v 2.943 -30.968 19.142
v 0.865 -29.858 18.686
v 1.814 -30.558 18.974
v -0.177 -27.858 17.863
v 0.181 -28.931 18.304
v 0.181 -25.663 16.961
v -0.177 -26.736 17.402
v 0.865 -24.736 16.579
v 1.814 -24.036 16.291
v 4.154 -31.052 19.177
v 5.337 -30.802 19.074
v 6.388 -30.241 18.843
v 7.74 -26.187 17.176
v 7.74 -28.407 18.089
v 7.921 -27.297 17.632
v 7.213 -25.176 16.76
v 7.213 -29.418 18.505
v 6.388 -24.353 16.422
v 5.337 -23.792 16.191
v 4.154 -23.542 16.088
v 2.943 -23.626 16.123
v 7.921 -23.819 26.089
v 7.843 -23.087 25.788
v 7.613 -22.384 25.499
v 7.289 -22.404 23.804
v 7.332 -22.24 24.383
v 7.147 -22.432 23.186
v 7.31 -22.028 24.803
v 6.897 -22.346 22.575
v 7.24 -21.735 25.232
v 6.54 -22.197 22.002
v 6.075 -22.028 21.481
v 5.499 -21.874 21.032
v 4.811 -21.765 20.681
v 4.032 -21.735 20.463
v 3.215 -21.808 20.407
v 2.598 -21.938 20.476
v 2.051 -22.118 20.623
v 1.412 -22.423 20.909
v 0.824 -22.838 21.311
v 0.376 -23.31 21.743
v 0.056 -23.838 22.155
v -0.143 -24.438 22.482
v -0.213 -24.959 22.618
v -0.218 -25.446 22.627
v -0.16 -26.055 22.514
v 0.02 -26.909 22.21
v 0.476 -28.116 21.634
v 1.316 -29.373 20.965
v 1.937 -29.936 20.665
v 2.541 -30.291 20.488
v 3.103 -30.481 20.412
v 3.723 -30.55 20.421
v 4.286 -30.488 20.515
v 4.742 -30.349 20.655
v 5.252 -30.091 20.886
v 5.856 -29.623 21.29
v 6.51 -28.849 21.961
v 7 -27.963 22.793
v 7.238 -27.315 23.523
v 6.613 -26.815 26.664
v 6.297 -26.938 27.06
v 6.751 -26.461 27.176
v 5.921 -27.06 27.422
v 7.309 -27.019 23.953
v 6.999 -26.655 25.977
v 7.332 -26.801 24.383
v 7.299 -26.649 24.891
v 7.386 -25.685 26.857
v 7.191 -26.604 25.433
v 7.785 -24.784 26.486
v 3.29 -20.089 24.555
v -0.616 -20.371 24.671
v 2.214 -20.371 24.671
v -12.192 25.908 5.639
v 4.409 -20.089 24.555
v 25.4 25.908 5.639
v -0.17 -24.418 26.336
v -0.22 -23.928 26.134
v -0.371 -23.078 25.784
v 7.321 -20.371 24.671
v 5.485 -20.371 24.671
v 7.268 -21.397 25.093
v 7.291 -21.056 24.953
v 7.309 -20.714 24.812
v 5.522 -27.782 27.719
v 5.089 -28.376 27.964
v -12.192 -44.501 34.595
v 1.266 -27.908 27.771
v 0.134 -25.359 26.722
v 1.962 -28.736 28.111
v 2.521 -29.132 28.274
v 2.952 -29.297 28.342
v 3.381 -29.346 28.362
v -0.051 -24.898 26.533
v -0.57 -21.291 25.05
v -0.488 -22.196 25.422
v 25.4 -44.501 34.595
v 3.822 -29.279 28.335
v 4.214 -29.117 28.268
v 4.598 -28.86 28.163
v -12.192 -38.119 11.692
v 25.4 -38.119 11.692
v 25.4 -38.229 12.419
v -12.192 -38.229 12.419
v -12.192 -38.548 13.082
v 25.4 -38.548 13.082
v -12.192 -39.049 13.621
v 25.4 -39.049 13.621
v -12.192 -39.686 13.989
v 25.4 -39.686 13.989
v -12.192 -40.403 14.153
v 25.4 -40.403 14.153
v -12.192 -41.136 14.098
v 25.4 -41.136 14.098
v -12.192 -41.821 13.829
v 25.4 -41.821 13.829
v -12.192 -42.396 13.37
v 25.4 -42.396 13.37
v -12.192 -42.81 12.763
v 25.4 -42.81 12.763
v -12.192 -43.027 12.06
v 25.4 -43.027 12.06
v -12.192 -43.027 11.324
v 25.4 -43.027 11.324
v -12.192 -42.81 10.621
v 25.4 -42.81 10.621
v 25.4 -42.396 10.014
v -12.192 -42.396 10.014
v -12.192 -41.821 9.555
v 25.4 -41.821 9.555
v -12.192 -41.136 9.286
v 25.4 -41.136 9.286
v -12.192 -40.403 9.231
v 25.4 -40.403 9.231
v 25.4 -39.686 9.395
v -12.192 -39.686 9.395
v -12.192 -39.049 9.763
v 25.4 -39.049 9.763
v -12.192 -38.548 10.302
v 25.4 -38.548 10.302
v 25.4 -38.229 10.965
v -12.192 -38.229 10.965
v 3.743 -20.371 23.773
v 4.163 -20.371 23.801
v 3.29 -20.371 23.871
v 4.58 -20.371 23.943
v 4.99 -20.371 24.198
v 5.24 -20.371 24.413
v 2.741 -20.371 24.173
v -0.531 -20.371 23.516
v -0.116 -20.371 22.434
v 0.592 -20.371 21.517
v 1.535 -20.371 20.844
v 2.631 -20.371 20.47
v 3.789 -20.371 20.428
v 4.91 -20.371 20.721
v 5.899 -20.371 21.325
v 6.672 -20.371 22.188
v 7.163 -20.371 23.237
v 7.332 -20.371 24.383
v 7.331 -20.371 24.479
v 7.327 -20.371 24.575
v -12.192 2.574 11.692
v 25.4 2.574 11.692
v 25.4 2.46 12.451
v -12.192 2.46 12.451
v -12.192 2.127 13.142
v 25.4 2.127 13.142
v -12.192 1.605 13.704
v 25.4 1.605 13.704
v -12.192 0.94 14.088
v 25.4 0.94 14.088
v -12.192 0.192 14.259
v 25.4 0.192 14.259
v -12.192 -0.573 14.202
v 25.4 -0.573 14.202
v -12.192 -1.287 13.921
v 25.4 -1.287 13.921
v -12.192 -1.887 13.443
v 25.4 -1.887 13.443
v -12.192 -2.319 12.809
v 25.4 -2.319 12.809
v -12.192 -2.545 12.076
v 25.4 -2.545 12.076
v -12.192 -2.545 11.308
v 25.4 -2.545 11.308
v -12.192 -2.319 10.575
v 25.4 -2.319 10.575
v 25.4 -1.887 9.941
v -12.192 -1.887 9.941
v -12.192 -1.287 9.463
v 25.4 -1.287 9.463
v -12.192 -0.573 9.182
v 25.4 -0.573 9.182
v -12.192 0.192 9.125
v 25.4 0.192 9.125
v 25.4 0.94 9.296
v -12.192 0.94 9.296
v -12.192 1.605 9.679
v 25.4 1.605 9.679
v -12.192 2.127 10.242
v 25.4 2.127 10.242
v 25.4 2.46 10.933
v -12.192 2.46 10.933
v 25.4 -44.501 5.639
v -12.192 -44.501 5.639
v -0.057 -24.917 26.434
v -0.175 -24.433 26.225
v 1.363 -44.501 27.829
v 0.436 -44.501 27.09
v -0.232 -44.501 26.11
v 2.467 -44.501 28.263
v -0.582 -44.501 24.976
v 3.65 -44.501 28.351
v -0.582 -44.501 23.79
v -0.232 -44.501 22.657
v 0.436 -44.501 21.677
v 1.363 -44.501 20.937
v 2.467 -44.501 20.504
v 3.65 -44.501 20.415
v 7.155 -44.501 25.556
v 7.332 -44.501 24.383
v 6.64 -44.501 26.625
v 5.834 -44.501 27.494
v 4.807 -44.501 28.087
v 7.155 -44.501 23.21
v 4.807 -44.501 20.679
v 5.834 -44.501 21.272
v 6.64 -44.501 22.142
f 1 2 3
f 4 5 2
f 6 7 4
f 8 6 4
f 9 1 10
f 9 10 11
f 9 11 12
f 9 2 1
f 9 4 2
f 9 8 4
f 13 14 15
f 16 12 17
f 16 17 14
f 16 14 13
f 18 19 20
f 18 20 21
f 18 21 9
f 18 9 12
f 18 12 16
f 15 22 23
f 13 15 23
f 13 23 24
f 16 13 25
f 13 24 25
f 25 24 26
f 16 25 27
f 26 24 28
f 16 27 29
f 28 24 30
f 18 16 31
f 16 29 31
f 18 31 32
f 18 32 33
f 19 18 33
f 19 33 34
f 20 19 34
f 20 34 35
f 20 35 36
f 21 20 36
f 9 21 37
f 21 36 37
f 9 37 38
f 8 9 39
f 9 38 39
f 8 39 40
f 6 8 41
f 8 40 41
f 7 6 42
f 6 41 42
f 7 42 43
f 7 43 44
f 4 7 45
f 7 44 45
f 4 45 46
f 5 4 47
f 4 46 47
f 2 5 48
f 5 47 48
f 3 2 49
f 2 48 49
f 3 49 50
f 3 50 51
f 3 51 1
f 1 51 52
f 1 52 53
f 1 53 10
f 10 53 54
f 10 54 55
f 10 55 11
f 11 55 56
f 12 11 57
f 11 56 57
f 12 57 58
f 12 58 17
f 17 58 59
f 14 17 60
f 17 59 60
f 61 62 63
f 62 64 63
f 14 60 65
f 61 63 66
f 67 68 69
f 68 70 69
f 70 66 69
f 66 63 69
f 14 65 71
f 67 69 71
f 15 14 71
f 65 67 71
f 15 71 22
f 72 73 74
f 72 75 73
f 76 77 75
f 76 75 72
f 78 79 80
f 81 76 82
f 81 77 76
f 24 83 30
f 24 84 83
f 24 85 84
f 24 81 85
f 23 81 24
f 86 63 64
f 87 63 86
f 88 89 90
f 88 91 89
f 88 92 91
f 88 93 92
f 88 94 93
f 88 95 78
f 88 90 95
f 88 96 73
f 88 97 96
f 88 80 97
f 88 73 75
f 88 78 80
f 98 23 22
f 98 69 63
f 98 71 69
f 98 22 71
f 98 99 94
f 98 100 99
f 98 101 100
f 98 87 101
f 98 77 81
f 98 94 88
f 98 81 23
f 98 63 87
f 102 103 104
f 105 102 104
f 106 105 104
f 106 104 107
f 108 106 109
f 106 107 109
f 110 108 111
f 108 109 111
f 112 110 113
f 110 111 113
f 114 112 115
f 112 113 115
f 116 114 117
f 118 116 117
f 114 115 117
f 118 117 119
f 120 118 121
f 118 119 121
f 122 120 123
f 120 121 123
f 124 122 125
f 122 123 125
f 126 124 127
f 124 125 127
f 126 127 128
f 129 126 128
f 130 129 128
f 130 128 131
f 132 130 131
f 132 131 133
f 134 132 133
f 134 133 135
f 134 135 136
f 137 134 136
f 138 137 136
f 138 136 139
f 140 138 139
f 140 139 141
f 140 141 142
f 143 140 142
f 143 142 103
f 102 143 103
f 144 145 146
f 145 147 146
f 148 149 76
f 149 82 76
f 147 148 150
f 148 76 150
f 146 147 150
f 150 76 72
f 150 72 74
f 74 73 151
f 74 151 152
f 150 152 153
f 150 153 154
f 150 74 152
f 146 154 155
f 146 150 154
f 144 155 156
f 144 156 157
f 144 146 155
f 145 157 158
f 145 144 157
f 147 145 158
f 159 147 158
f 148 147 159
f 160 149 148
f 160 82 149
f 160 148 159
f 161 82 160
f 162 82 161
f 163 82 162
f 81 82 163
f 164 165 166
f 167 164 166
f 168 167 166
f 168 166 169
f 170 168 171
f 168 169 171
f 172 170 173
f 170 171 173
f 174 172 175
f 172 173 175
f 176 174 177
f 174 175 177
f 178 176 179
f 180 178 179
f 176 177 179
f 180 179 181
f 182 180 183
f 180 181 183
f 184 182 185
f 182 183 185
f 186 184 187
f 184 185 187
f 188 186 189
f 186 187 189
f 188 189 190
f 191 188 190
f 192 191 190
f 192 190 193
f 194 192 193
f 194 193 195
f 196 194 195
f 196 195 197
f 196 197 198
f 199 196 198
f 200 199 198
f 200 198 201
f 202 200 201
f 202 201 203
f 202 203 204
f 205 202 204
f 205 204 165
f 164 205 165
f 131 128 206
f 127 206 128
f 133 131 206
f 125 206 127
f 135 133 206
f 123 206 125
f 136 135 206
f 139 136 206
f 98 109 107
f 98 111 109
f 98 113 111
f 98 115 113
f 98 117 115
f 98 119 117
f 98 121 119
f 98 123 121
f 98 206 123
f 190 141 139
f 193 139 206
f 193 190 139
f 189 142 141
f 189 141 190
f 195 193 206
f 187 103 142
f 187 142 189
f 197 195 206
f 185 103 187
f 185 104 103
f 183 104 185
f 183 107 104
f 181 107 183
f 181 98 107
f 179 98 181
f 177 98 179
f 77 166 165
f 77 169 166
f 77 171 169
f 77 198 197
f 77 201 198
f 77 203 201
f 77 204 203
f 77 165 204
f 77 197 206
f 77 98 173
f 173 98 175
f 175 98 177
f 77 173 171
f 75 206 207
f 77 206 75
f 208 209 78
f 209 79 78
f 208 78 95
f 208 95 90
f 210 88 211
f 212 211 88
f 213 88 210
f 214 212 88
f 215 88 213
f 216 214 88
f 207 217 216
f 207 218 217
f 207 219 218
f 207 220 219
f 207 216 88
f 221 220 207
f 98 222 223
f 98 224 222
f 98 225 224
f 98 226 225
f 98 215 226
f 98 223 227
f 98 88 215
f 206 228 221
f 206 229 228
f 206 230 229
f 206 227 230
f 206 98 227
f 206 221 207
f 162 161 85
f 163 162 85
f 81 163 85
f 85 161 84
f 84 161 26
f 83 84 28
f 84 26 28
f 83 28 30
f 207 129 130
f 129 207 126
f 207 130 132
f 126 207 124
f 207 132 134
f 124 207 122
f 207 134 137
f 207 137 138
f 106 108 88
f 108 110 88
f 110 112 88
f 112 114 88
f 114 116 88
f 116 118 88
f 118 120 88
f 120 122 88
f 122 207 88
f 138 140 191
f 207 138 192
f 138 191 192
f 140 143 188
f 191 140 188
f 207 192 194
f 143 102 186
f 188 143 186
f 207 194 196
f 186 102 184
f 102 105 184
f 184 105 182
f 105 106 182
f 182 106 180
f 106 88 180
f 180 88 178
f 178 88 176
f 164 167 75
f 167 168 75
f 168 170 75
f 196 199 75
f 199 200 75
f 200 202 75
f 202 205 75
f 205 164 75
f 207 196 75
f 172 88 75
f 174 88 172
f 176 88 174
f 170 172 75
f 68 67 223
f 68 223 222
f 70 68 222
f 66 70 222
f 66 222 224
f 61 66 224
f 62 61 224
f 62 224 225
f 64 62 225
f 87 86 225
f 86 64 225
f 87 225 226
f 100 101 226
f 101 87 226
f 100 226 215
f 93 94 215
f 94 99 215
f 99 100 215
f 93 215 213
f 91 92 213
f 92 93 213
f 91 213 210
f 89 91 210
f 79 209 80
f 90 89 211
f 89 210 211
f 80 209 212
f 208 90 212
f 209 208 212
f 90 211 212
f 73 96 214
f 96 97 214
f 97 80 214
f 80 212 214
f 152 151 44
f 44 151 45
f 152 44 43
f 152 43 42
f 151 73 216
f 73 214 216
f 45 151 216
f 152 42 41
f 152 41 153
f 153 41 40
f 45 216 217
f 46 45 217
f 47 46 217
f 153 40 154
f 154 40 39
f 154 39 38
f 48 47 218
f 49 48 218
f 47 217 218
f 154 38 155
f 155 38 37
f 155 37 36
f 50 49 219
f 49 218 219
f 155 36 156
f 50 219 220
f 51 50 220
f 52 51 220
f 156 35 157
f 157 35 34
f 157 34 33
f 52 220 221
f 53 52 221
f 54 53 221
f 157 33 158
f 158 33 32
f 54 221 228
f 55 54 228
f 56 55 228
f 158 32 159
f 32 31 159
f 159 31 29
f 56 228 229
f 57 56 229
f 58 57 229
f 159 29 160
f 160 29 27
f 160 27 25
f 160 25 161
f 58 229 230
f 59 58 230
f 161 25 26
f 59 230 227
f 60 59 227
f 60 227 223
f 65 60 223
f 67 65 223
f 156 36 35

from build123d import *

# Parameters (mm, degrees)
F1_DEPTH = 25.4
F2_DEPTH = 12.192
F3_R     = 2.4676693698
F3_R_2   = 2.5740966664
F4_DEPTH = 43.18
F5_R     = 4.0713593192
F6_DEPTH = 9.144
F7_R     = 3.9791108566
F8_DEPTH = 24.13


with BuildPart() as f1:
    # F0 (on Right) → F1 (new body)
    with BuildSketch(Plane.YZ):
        Polygon((25.9079989046, 5.6388000958), (-44.5008017123, 34.5948003232), (-44.5008017123, 5.6388000958), align=None)
    extrude(amount=F1_DEPTH)

    # F2 (add): a face of the model
    f2_faces = [f1.faces().sort_by_distance(p)[0] for p in [
        (0, -21.0312015067, 15.2908001716),
    ]]
    extrude(f2_faces, amount=F2_DEPTH)

    # F3 (on face) → F4 (cut)
    with BuildSketch(Plane.YZ.offset(25.4)):
        with Locations((-40.5871495605, 11.6919511929)):
            Circle(F3_R)
        with Locations((0, 11.6919511929)):
            Circle(F3_R_2)
    extrude(amount=-F4_DEPTH, mode=Mode.SUBTRACT)

    # F5 (on face) → F6 (cut)
    with BuildSketch(Plane(origin=(0, 5.731464716, 13.9365089537), x_dir=(1, 0, 0), z_dir=(0, 0.3803470345, 0.9248438427))):
        with Locations((3.8493340835, -31.9517701864)):
            Circle(F5_R)
    extrude(amount=-F6_DEPTH, mode=Mode.SUBTRACT)

    # F7 (on face) → F8 (cut)
    with BuildSketch(Plane.XZ.offset(44.5008017123)):
        with Locations((3.3528024796, 24.3832562119)):
            Circle(F7_R)
    extrude(amount=-F8_DEPTH, mode=Mode.SUBTRACT)


solid = f1.part
